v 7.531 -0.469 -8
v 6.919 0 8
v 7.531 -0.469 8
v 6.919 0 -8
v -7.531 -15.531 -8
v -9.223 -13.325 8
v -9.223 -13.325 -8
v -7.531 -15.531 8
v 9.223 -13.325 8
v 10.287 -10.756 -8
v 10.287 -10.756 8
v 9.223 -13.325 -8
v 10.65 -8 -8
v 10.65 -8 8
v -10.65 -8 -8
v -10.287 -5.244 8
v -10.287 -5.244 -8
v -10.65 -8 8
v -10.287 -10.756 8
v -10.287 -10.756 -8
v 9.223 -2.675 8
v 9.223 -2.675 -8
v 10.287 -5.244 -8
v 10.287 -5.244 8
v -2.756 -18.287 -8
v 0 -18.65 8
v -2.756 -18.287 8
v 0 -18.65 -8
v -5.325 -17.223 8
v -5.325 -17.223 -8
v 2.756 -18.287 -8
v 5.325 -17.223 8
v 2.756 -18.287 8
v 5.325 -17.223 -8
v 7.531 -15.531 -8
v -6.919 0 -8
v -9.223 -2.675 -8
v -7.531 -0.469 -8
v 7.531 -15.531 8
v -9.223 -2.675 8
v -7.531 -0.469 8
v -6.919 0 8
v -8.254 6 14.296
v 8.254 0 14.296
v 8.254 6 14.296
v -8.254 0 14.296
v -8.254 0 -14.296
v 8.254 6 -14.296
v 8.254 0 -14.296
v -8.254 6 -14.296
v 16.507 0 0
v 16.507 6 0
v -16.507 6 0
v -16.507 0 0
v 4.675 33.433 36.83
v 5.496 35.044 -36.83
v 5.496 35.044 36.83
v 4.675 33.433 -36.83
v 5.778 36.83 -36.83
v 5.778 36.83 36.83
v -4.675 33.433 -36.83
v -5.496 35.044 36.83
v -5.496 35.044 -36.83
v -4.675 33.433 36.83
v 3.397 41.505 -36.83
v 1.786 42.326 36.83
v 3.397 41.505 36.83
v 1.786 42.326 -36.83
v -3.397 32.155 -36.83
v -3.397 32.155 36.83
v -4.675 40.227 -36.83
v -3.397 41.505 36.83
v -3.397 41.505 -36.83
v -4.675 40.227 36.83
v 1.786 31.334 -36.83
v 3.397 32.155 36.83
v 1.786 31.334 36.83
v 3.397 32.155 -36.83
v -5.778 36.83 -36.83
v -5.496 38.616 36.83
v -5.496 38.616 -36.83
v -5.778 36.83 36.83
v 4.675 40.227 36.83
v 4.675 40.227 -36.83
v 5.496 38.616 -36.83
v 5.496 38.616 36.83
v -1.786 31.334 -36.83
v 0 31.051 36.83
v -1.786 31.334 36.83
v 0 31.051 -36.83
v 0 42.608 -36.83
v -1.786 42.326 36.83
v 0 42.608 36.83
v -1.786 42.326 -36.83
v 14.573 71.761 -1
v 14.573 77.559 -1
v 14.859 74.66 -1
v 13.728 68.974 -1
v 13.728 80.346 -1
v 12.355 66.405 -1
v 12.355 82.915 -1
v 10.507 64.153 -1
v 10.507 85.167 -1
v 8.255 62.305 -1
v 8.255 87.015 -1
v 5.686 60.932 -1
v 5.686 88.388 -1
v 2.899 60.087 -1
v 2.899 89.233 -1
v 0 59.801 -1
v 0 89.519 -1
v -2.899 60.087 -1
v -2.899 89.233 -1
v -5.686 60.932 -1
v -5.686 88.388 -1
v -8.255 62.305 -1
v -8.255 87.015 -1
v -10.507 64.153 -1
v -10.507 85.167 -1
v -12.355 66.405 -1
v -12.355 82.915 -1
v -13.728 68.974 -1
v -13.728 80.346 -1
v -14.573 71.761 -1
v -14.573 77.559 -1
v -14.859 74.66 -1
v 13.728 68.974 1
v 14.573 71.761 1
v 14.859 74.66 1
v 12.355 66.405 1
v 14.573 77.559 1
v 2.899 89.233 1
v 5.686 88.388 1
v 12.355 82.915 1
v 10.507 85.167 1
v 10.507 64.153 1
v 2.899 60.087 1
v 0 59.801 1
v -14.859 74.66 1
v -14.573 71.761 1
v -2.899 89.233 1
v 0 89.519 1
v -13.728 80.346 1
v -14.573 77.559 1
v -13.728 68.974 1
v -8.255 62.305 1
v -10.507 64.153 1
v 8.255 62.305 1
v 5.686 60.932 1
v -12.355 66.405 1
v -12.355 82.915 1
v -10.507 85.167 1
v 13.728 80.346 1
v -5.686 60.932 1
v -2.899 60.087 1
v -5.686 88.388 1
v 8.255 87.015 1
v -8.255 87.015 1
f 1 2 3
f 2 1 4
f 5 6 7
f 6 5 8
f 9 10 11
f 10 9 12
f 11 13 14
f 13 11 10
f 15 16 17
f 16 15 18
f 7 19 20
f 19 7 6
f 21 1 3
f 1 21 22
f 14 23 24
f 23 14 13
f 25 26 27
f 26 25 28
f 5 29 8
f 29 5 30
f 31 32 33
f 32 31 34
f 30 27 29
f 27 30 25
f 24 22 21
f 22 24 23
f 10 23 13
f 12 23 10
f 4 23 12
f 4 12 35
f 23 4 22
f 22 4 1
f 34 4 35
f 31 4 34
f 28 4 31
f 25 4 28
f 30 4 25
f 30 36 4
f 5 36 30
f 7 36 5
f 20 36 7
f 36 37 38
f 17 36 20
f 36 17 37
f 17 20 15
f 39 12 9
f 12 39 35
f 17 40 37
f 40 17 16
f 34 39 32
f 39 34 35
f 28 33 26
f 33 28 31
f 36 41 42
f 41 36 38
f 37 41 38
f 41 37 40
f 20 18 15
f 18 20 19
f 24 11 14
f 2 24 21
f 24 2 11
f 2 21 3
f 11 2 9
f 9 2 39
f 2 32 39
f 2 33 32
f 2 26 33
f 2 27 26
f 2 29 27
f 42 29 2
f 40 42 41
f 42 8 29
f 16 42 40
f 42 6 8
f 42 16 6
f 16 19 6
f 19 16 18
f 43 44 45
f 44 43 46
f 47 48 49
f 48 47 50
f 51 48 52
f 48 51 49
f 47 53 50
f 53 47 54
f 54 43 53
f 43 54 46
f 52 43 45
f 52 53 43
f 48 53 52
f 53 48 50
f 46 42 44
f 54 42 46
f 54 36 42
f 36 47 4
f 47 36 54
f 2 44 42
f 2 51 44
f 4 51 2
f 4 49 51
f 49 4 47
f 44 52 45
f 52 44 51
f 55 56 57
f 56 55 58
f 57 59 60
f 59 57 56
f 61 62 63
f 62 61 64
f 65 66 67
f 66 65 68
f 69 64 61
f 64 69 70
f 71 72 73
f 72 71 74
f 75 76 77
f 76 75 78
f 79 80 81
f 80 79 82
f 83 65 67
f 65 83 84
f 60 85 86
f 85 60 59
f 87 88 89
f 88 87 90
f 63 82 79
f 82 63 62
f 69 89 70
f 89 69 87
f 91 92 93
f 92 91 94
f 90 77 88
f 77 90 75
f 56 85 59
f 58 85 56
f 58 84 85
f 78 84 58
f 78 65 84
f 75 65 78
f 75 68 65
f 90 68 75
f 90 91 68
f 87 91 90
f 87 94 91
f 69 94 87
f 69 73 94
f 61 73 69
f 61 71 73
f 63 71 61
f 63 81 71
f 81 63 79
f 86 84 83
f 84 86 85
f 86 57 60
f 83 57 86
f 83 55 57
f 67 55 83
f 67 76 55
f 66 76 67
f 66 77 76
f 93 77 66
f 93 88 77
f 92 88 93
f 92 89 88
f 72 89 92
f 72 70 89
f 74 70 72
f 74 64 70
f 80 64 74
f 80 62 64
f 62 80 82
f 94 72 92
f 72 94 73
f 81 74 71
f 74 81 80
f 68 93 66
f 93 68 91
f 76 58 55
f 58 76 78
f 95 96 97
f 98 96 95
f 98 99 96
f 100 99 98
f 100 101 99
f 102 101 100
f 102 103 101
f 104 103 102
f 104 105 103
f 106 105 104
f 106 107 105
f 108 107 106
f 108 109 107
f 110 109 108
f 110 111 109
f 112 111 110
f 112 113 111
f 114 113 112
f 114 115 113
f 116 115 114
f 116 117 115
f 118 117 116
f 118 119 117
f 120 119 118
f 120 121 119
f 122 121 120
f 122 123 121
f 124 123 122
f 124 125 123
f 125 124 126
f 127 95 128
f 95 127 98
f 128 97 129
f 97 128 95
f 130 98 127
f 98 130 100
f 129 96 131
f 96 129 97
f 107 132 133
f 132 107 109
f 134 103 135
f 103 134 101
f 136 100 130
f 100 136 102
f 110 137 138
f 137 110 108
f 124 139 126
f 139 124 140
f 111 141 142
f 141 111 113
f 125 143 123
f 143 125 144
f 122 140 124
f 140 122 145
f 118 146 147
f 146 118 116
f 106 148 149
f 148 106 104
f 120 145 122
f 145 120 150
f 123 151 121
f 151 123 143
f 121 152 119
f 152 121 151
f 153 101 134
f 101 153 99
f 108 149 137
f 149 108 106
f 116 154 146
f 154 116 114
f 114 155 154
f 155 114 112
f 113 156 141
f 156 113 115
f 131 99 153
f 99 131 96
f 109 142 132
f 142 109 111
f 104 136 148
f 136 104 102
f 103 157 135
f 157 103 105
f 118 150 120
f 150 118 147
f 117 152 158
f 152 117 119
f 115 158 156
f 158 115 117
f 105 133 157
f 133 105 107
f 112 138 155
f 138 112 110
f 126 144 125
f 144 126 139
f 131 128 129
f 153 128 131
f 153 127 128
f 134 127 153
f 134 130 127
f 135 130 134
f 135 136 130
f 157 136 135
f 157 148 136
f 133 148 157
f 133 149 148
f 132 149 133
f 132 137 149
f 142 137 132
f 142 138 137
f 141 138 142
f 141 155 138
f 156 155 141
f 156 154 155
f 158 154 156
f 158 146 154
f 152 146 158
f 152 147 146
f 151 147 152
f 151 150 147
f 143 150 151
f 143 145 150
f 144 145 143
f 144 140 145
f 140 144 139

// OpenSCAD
// Auto-generated by scripts/author_from_manifest.py (Phase D.3).
// Source: data/phase_d_manifest.json (sku_intent='tyco-ty6226-esfr-upright-k140-214f').
// Do not hand-edit — regenerate from the manifest.
//
// @part tyco_ty6226_esfr_upright_k140_214f
// @kind sprinkler_head
// @category head.upright.k140
// @display-name "Tyco TY6226 ESFR Upright K14.0 214°F"
// @mfg tyco_fire_protection
// @mfg-pn TY6226
// @listing UL FM
// @hazard-classes ESFR
// @price-usd 48.00
// @install-minutes 12
// @crew journeyman
// @k-factor 14
// @orientation upright
// @response quick
// @temperature 214F
// @param size_in number default=0.5 label="Size" unit="in"
// @port inlet position=[0,0.014,0] direction=[0,1,0] style=NPT_threaded size_in=0.75 role=drop

size_in = 0.5;
k_factor = 14.0;

length_mm   = 73.66;
body_dia_mm = 33.02;
thread_od   = 21.3;
thread_len  = 16;
deflector_d = body_dia_mm * 0.9;

rotate([180,0,0]) union() {
    translate([0, thread_len/2, 0])
        cylinder(h = thread_len, d = thread_od, center = true, $fn = 24);
    translate([0, -3, 0])
        rotate([90, 0, 0])
        cylinder(h = 6, d = thread_od * 1.55, $fn = 6, center = true);
    translate([0, -length_mm/2, 0])
        cylinder(h = length_mm, d = body_dia_mm * 0.35, center = true, $fn = 20);
    translate([0, -length_mm - 1, 0])
        cylinder(h = 2, d = deflector_d, center = true, $fn = 32);
}
